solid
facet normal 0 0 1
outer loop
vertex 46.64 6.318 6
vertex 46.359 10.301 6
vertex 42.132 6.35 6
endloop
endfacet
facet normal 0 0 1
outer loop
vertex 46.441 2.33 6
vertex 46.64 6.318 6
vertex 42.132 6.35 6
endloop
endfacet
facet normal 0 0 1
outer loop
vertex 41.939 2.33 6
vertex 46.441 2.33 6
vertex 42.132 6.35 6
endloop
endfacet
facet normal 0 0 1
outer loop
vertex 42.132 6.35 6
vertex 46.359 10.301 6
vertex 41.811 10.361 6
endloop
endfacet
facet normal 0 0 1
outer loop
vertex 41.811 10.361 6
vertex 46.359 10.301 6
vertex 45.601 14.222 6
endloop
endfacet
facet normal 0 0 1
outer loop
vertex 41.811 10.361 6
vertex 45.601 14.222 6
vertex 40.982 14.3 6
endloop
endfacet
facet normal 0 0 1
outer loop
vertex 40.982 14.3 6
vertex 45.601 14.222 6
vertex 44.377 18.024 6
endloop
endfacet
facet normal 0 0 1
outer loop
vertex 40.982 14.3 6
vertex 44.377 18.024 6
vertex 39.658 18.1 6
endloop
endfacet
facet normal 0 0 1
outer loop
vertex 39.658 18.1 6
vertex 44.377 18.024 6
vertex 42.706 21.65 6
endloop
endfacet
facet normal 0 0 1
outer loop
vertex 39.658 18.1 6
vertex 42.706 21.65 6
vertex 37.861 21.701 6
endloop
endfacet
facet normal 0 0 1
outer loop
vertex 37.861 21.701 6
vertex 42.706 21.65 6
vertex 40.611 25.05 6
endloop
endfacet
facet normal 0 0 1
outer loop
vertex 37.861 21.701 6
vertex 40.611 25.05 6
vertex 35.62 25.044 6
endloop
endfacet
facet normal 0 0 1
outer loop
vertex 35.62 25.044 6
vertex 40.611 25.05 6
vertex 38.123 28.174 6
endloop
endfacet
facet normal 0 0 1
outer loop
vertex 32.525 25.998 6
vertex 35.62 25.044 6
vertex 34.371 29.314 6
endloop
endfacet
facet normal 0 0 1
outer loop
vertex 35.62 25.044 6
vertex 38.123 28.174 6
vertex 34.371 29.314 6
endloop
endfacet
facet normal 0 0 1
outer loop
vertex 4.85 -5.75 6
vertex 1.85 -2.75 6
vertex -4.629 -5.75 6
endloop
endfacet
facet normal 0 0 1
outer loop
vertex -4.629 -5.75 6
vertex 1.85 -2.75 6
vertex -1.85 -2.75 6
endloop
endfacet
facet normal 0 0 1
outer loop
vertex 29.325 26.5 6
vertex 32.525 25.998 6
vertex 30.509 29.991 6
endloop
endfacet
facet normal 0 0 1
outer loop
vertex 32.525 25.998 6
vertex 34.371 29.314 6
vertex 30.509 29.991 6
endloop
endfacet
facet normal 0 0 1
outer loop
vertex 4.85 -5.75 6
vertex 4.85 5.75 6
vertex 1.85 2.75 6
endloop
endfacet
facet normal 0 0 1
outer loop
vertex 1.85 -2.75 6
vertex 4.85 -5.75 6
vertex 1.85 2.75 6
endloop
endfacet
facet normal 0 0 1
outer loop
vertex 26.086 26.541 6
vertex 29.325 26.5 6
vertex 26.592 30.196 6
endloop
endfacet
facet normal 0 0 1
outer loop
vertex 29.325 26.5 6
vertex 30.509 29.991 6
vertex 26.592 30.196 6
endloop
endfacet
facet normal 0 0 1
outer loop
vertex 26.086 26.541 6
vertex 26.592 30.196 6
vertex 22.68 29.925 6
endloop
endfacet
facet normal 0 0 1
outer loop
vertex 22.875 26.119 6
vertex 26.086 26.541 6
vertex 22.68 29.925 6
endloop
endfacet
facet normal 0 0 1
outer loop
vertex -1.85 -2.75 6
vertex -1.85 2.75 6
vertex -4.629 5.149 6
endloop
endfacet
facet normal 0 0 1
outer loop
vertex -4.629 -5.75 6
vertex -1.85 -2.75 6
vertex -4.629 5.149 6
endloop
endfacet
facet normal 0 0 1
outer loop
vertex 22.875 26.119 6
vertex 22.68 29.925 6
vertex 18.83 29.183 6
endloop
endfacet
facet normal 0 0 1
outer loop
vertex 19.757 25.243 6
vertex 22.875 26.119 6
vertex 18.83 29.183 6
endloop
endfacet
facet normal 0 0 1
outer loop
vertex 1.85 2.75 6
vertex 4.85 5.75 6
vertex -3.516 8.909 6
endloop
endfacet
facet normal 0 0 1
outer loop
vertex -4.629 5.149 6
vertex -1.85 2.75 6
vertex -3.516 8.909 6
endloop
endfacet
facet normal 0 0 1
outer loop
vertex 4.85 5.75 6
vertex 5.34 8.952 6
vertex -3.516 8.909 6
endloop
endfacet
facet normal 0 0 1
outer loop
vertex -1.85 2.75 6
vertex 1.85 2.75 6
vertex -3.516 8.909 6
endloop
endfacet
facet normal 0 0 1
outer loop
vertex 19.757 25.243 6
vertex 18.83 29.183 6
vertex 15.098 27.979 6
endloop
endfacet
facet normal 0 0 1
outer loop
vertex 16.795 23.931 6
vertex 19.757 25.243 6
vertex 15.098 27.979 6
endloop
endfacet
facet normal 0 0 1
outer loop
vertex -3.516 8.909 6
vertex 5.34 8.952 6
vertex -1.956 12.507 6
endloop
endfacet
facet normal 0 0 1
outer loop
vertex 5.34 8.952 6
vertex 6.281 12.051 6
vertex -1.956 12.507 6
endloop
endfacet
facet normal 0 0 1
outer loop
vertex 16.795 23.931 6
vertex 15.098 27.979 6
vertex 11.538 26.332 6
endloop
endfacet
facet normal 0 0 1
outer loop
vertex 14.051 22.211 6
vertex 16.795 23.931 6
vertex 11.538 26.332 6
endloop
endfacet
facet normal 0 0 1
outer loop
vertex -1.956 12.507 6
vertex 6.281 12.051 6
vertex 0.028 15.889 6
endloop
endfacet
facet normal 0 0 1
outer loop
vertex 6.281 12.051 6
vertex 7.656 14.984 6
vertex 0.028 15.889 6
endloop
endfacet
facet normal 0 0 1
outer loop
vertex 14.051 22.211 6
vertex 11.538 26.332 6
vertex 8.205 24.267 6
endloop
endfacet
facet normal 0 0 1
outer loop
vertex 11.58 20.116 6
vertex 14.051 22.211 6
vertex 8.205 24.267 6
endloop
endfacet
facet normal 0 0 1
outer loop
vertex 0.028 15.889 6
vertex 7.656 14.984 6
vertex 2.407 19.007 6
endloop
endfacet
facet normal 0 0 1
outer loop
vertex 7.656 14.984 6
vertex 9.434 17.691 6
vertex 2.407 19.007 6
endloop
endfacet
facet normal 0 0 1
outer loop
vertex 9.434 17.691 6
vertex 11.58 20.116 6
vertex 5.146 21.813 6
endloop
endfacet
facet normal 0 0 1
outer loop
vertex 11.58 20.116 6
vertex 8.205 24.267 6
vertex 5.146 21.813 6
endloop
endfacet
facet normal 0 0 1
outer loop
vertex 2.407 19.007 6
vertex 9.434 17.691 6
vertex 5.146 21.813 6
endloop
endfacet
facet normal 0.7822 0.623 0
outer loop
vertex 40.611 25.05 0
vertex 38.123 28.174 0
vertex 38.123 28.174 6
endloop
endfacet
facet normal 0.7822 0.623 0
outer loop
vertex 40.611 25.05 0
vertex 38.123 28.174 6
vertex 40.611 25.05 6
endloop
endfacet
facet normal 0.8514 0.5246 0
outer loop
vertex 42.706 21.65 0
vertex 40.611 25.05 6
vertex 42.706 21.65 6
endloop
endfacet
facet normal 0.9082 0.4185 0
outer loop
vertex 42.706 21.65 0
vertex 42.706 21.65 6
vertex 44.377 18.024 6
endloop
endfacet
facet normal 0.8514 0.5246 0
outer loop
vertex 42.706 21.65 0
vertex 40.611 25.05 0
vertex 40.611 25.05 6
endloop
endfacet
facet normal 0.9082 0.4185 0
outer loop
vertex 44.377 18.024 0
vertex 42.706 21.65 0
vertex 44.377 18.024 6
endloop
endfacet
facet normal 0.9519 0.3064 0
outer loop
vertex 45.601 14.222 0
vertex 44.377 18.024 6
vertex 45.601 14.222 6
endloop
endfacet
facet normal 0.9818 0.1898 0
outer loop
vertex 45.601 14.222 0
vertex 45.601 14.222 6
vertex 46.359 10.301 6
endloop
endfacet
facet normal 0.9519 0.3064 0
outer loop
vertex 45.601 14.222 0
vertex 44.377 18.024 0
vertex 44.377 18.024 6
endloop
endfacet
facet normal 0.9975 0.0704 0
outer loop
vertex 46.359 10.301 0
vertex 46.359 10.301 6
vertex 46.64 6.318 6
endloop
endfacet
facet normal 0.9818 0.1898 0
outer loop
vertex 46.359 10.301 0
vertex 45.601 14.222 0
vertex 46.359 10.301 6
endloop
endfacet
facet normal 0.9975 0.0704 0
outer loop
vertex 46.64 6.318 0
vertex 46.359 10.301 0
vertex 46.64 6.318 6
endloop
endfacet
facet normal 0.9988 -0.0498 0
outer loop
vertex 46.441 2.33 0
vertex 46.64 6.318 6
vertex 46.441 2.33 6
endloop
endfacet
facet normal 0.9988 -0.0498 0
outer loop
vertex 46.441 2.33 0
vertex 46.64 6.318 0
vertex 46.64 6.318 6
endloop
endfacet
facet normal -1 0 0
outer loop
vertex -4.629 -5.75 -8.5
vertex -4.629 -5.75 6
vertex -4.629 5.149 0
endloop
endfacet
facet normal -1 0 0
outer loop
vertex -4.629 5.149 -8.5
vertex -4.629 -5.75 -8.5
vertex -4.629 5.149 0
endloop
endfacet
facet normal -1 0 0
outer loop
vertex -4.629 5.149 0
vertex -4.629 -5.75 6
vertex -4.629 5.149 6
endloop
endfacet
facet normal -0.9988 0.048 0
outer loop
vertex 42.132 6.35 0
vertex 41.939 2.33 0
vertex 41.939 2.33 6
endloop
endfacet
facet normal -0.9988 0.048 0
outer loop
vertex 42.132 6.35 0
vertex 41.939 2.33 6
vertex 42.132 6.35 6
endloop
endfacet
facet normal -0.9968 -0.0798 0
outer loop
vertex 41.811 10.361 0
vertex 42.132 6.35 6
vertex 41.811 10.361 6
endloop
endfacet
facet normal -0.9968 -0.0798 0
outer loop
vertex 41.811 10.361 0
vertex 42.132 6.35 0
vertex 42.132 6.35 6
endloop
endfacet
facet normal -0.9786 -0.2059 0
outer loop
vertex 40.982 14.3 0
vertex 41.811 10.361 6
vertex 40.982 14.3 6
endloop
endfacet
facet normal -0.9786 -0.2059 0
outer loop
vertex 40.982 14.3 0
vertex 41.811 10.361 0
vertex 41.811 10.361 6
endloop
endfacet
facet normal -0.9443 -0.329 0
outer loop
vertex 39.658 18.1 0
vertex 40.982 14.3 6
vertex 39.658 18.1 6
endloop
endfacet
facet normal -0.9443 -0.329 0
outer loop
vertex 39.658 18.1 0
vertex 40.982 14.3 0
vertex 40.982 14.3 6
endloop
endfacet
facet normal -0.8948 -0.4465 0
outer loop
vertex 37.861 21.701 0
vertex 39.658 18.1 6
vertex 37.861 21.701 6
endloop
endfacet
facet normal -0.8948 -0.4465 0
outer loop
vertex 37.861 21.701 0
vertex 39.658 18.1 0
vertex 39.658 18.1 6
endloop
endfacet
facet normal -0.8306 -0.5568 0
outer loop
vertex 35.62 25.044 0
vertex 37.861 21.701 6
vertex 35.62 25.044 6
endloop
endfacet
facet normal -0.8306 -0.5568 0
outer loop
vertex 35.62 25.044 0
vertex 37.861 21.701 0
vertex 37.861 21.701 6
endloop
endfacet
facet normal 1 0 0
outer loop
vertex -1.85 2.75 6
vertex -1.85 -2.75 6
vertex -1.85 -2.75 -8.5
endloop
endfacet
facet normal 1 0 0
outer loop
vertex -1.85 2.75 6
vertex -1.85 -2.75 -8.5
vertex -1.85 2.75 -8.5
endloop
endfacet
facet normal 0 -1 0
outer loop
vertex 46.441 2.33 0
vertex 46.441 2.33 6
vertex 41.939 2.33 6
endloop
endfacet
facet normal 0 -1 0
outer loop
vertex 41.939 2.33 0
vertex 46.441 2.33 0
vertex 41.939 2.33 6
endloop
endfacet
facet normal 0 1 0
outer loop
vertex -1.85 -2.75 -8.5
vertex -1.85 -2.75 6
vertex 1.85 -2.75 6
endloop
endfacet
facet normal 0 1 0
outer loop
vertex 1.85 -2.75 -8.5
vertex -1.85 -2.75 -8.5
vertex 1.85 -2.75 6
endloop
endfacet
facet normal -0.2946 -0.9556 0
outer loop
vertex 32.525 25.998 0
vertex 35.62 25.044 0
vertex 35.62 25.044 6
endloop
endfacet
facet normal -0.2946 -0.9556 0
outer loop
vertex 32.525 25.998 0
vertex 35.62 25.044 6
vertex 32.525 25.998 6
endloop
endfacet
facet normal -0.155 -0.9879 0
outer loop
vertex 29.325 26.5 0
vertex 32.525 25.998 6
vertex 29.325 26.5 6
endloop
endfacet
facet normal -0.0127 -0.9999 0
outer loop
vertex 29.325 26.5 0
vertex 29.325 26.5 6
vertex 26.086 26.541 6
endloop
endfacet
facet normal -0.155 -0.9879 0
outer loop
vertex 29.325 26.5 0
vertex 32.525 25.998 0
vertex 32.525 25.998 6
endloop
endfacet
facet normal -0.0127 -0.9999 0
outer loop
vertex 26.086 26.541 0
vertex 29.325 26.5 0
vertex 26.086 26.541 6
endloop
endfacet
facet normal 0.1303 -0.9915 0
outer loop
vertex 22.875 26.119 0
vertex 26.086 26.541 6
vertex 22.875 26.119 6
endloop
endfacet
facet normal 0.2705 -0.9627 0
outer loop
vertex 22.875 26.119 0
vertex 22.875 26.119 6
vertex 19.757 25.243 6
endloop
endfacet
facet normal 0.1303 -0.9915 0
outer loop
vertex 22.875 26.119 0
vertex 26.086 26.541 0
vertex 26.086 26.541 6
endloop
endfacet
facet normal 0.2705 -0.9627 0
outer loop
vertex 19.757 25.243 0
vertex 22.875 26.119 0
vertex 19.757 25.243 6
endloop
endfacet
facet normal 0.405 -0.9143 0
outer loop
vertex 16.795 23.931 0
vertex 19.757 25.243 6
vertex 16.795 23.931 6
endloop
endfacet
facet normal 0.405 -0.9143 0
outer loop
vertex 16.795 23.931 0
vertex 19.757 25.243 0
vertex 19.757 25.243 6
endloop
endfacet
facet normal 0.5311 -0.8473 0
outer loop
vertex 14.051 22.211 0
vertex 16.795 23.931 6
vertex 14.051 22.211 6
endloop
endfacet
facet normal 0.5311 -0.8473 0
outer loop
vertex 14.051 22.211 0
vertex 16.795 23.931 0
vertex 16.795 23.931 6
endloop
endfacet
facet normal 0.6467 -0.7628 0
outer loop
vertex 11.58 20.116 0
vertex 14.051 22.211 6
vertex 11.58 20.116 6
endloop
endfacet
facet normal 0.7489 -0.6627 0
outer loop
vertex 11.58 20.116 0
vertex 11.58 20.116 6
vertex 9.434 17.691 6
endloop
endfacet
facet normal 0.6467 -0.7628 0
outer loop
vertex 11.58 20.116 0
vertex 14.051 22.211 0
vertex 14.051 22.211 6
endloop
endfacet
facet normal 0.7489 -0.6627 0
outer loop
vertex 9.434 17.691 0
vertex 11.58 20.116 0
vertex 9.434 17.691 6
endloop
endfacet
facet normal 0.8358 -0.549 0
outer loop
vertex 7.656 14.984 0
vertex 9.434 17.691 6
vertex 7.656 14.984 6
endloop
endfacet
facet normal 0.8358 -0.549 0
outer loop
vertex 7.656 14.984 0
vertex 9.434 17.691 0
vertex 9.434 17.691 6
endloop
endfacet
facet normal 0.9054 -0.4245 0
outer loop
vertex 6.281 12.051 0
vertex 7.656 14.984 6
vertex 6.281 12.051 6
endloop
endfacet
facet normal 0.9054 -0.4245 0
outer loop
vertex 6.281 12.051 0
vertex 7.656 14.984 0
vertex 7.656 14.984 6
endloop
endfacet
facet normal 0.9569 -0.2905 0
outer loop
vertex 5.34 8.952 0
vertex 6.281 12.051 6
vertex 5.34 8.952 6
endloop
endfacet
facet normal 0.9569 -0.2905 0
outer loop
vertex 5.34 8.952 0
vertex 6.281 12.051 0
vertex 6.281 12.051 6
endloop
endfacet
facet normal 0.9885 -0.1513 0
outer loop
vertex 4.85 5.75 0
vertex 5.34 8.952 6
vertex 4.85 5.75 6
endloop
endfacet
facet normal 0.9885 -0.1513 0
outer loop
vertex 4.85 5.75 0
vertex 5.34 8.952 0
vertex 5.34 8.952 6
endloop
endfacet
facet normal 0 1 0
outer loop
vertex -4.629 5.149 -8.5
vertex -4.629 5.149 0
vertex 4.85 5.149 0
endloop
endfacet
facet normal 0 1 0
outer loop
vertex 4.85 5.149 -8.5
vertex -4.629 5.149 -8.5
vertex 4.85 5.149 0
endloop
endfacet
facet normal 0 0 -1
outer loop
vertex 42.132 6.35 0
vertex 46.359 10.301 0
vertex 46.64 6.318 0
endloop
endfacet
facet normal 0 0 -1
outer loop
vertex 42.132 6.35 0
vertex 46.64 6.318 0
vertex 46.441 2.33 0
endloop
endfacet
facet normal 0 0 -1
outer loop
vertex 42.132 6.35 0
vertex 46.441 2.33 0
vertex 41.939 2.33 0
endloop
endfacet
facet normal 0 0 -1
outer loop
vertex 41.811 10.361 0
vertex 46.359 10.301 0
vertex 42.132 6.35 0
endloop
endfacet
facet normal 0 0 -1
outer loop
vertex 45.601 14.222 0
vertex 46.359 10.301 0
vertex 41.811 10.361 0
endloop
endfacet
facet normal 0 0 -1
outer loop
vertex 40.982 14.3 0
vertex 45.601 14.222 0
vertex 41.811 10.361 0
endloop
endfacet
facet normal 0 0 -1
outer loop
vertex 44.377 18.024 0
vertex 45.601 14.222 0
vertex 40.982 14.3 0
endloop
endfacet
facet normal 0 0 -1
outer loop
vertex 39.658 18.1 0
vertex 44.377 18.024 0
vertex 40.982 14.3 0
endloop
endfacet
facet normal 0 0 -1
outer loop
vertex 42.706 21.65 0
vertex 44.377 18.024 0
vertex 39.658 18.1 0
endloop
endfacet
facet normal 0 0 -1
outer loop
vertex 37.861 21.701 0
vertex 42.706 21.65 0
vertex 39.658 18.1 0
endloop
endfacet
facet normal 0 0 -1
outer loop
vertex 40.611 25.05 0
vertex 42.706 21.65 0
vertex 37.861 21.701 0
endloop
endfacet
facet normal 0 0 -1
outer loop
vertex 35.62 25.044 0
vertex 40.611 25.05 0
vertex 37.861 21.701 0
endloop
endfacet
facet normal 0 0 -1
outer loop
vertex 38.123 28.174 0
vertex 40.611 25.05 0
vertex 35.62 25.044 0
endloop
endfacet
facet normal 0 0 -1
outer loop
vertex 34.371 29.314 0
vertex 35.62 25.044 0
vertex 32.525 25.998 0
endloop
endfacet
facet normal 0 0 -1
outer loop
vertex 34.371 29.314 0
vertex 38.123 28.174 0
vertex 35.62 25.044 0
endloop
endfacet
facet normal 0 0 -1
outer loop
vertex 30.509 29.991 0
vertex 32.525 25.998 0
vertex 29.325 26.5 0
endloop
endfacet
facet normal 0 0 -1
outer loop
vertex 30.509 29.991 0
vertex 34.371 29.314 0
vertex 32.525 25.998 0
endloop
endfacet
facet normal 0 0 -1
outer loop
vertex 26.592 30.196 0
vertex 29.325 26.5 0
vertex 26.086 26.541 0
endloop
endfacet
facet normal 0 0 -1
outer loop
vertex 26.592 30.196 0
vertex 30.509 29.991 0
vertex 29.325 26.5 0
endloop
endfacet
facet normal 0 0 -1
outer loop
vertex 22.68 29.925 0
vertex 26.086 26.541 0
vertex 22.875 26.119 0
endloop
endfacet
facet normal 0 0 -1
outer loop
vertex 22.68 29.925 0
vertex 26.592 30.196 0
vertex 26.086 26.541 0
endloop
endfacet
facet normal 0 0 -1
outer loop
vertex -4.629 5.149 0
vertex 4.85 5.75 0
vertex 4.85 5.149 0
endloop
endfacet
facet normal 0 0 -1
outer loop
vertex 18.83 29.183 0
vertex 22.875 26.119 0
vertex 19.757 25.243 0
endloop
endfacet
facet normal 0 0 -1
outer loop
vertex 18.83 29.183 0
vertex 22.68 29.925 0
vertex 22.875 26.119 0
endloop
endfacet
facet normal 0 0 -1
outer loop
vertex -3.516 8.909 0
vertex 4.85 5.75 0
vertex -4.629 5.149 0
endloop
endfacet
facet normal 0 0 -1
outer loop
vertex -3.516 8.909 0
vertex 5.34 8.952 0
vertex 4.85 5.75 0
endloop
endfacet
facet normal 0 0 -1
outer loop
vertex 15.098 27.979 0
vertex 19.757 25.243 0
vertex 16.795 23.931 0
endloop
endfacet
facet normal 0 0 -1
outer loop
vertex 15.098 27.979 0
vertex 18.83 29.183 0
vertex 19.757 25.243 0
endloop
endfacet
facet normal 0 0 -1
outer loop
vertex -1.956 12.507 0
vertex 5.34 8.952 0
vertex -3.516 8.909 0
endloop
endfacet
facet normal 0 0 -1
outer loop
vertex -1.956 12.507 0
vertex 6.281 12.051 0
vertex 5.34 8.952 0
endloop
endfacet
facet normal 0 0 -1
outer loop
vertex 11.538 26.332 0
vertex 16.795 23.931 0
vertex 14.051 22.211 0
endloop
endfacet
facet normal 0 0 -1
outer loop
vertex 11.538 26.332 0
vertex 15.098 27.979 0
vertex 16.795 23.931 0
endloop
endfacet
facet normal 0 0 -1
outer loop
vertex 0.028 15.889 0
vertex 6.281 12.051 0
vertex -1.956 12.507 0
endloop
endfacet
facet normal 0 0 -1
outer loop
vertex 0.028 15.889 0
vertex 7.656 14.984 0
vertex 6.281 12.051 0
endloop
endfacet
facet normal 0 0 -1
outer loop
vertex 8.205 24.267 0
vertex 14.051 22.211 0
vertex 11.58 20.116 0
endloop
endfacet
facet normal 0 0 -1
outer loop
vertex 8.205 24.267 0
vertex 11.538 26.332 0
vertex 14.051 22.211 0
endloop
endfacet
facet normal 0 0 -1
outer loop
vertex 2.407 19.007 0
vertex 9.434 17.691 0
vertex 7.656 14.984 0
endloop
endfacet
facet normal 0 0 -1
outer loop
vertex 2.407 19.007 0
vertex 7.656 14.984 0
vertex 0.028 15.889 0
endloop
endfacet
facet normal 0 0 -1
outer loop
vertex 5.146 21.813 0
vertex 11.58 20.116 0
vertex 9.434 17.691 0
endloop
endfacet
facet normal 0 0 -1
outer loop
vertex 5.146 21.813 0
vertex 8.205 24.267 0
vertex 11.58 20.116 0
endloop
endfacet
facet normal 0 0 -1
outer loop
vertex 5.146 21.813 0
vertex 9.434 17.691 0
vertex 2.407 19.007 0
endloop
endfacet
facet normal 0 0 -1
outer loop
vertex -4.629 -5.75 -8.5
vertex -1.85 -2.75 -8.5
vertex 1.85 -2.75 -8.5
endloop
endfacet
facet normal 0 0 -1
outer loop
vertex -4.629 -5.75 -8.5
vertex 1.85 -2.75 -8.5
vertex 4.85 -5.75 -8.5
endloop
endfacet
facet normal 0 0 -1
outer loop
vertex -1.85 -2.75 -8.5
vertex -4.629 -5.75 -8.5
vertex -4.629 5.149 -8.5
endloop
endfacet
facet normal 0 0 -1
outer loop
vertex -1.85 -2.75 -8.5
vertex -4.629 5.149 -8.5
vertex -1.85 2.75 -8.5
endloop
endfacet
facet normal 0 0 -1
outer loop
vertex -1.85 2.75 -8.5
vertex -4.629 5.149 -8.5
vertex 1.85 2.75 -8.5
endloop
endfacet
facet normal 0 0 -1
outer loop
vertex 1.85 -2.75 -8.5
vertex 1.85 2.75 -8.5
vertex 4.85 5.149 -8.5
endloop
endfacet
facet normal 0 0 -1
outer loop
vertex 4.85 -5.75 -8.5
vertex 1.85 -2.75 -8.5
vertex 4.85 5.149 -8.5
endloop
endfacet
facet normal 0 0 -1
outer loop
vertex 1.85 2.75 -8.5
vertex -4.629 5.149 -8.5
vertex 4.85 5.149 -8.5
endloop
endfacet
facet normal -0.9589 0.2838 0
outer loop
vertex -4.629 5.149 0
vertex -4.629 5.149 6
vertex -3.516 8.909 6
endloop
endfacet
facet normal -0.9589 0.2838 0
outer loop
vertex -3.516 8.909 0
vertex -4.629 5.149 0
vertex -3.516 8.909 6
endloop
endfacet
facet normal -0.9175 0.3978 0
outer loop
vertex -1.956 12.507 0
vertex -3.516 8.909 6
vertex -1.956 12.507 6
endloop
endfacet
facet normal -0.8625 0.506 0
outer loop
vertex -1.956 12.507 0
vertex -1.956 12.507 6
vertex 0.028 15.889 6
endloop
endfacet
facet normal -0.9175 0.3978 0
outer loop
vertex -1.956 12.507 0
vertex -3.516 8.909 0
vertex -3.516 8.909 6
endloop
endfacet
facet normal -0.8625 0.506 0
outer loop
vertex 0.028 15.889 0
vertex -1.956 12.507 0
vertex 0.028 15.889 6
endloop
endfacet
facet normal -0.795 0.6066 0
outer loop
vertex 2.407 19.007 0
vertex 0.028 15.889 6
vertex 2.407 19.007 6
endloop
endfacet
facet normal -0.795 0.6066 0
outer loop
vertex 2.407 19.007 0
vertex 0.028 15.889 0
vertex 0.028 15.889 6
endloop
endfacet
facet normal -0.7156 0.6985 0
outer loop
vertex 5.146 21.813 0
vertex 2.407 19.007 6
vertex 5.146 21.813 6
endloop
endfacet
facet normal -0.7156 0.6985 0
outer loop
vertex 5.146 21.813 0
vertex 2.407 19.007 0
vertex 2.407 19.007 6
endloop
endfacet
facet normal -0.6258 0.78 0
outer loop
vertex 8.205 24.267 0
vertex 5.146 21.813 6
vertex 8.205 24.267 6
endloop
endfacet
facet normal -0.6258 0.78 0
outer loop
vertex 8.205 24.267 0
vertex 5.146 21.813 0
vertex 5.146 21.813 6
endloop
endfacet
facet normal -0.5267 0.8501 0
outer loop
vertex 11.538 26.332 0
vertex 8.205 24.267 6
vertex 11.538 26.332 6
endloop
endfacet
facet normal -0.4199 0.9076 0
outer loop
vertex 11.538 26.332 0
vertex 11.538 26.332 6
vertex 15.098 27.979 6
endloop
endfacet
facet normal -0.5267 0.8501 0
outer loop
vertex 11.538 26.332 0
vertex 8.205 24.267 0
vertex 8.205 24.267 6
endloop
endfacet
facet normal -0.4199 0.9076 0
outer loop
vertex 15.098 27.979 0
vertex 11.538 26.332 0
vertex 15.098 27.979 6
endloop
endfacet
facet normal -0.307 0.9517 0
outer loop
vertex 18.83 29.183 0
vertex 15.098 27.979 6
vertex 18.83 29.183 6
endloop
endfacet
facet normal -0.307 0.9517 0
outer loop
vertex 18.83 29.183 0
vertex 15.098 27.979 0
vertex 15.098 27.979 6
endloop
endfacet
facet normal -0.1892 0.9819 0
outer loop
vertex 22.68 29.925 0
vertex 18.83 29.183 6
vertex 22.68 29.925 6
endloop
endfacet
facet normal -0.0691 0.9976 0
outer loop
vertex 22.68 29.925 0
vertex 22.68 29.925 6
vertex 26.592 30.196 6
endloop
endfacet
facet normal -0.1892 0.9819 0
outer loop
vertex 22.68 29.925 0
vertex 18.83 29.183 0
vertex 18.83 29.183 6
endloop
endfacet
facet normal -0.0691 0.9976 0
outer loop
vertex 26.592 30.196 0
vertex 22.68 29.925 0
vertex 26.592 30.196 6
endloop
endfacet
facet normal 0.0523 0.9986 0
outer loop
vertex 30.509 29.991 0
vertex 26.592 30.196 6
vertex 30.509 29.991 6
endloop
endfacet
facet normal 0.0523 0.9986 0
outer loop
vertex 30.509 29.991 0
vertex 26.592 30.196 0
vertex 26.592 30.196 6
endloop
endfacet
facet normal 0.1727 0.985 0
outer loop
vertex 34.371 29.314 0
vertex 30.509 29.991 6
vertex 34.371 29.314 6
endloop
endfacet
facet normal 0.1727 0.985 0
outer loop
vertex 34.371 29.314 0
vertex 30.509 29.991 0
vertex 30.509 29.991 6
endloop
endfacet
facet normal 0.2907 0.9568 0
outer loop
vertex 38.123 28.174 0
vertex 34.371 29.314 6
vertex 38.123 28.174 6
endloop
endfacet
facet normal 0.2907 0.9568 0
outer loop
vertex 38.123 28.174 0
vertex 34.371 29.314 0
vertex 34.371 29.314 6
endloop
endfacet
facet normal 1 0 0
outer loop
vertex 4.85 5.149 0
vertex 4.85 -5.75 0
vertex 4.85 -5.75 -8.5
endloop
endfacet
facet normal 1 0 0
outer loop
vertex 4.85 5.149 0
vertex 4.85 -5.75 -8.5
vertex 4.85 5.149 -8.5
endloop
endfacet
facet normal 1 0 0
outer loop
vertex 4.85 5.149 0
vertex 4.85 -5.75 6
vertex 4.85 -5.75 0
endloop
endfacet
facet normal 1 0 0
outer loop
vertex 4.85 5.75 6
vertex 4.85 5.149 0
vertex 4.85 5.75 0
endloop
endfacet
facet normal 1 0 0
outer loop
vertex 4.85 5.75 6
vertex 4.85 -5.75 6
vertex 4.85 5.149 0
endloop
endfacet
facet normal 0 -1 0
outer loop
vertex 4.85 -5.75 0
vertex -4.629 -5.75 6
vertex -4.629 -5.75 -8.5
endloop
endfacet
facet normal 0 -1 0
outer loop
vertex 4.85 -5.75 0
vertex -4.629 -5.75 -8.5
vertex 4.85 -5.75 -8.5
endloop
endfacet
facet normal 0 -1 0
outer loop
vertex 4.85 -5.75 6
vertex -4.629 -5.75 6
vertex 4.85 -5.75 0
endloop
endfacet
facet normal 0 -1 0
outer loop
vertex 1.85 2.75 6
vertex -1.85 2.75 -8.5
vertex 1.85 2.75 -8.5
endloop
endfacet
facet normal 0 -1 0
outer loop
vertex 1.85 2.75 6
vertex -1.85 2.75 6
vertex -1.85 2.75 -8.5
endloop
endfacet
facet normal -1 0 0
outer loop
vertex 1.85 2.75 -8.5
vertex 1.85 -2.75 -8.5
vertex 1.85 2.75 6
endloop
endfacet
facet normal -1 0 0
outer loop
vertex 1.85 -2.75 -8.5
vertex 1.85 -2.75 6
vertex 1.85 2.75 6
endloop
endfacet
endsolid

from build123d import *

# Parameters (mm, degrees)
SKETCH1_W           = 3.7
SKETCH1_H           = 5.5
BOSS_EXTRUDE1_DEPTH = 6
SKETCH3_W           = 9.478987056
SKETCH3_H           = 10.898659885
SKETCH3_W_2         = 3.7
SKETCH3_H_2         = 5.5
BOSS_EXTRUDE2_DEPTH = 8.5


with BuildPart() as part:
    # Sketch1 → Boss-Extrude1 (new body)
    with BuildSketch(Plane.XY):
        with BuildLine():
            Line((4.85, 5.75), (4.85, -5.75))
            Line((4.85, -5.75), (-4.628987056, -5.75))
            Line((-4.628987056, -5.75), (-4.628987056, 5.148659885))
            ThreePointArc((-4.628987056, 5.148659885), (11.538438682, 26.332485721), (38.123219895, 28.173556039))
            ThreePointArc((38.123219895, 28.173556039), (45.046416869, 16.141331151), (46.440789316, 2.329712217))
            Line((46.440789316, 2.329712217), (41.93897109, 2.329712217))
            ThreePointArc((41.93897109, 2.329712217), (40.981754891, 14.299726349), (35.619891873, 25.044396012))
            ThreePointArc((35.619891873, 25.044396012), (15.392209294, 23.120190877), (4.85, 5.75))
        make_face()
        Rectangle(SKETCH1_W, SKETCH1_H, mode=Mode.SUBTRACT)
    extrude(amount=BOSS_EXTRUDE1_DEPTH)

    # Sketch3 → Boss-Extrude2 (add)
    with BuildSketch(Plane.XY):
        with Locations((0.110506472, -0.300670057)):
            Rectangle(SKETCH3_W, SKETCH3_H)
        Rectangle(SKETCH3_W_2, SKETCH3_H_2, mode=Mode.SUBTRACT)
    extrude(amount=-BOSS_EXTRUDE2_DEPTH)


solid = part.part
